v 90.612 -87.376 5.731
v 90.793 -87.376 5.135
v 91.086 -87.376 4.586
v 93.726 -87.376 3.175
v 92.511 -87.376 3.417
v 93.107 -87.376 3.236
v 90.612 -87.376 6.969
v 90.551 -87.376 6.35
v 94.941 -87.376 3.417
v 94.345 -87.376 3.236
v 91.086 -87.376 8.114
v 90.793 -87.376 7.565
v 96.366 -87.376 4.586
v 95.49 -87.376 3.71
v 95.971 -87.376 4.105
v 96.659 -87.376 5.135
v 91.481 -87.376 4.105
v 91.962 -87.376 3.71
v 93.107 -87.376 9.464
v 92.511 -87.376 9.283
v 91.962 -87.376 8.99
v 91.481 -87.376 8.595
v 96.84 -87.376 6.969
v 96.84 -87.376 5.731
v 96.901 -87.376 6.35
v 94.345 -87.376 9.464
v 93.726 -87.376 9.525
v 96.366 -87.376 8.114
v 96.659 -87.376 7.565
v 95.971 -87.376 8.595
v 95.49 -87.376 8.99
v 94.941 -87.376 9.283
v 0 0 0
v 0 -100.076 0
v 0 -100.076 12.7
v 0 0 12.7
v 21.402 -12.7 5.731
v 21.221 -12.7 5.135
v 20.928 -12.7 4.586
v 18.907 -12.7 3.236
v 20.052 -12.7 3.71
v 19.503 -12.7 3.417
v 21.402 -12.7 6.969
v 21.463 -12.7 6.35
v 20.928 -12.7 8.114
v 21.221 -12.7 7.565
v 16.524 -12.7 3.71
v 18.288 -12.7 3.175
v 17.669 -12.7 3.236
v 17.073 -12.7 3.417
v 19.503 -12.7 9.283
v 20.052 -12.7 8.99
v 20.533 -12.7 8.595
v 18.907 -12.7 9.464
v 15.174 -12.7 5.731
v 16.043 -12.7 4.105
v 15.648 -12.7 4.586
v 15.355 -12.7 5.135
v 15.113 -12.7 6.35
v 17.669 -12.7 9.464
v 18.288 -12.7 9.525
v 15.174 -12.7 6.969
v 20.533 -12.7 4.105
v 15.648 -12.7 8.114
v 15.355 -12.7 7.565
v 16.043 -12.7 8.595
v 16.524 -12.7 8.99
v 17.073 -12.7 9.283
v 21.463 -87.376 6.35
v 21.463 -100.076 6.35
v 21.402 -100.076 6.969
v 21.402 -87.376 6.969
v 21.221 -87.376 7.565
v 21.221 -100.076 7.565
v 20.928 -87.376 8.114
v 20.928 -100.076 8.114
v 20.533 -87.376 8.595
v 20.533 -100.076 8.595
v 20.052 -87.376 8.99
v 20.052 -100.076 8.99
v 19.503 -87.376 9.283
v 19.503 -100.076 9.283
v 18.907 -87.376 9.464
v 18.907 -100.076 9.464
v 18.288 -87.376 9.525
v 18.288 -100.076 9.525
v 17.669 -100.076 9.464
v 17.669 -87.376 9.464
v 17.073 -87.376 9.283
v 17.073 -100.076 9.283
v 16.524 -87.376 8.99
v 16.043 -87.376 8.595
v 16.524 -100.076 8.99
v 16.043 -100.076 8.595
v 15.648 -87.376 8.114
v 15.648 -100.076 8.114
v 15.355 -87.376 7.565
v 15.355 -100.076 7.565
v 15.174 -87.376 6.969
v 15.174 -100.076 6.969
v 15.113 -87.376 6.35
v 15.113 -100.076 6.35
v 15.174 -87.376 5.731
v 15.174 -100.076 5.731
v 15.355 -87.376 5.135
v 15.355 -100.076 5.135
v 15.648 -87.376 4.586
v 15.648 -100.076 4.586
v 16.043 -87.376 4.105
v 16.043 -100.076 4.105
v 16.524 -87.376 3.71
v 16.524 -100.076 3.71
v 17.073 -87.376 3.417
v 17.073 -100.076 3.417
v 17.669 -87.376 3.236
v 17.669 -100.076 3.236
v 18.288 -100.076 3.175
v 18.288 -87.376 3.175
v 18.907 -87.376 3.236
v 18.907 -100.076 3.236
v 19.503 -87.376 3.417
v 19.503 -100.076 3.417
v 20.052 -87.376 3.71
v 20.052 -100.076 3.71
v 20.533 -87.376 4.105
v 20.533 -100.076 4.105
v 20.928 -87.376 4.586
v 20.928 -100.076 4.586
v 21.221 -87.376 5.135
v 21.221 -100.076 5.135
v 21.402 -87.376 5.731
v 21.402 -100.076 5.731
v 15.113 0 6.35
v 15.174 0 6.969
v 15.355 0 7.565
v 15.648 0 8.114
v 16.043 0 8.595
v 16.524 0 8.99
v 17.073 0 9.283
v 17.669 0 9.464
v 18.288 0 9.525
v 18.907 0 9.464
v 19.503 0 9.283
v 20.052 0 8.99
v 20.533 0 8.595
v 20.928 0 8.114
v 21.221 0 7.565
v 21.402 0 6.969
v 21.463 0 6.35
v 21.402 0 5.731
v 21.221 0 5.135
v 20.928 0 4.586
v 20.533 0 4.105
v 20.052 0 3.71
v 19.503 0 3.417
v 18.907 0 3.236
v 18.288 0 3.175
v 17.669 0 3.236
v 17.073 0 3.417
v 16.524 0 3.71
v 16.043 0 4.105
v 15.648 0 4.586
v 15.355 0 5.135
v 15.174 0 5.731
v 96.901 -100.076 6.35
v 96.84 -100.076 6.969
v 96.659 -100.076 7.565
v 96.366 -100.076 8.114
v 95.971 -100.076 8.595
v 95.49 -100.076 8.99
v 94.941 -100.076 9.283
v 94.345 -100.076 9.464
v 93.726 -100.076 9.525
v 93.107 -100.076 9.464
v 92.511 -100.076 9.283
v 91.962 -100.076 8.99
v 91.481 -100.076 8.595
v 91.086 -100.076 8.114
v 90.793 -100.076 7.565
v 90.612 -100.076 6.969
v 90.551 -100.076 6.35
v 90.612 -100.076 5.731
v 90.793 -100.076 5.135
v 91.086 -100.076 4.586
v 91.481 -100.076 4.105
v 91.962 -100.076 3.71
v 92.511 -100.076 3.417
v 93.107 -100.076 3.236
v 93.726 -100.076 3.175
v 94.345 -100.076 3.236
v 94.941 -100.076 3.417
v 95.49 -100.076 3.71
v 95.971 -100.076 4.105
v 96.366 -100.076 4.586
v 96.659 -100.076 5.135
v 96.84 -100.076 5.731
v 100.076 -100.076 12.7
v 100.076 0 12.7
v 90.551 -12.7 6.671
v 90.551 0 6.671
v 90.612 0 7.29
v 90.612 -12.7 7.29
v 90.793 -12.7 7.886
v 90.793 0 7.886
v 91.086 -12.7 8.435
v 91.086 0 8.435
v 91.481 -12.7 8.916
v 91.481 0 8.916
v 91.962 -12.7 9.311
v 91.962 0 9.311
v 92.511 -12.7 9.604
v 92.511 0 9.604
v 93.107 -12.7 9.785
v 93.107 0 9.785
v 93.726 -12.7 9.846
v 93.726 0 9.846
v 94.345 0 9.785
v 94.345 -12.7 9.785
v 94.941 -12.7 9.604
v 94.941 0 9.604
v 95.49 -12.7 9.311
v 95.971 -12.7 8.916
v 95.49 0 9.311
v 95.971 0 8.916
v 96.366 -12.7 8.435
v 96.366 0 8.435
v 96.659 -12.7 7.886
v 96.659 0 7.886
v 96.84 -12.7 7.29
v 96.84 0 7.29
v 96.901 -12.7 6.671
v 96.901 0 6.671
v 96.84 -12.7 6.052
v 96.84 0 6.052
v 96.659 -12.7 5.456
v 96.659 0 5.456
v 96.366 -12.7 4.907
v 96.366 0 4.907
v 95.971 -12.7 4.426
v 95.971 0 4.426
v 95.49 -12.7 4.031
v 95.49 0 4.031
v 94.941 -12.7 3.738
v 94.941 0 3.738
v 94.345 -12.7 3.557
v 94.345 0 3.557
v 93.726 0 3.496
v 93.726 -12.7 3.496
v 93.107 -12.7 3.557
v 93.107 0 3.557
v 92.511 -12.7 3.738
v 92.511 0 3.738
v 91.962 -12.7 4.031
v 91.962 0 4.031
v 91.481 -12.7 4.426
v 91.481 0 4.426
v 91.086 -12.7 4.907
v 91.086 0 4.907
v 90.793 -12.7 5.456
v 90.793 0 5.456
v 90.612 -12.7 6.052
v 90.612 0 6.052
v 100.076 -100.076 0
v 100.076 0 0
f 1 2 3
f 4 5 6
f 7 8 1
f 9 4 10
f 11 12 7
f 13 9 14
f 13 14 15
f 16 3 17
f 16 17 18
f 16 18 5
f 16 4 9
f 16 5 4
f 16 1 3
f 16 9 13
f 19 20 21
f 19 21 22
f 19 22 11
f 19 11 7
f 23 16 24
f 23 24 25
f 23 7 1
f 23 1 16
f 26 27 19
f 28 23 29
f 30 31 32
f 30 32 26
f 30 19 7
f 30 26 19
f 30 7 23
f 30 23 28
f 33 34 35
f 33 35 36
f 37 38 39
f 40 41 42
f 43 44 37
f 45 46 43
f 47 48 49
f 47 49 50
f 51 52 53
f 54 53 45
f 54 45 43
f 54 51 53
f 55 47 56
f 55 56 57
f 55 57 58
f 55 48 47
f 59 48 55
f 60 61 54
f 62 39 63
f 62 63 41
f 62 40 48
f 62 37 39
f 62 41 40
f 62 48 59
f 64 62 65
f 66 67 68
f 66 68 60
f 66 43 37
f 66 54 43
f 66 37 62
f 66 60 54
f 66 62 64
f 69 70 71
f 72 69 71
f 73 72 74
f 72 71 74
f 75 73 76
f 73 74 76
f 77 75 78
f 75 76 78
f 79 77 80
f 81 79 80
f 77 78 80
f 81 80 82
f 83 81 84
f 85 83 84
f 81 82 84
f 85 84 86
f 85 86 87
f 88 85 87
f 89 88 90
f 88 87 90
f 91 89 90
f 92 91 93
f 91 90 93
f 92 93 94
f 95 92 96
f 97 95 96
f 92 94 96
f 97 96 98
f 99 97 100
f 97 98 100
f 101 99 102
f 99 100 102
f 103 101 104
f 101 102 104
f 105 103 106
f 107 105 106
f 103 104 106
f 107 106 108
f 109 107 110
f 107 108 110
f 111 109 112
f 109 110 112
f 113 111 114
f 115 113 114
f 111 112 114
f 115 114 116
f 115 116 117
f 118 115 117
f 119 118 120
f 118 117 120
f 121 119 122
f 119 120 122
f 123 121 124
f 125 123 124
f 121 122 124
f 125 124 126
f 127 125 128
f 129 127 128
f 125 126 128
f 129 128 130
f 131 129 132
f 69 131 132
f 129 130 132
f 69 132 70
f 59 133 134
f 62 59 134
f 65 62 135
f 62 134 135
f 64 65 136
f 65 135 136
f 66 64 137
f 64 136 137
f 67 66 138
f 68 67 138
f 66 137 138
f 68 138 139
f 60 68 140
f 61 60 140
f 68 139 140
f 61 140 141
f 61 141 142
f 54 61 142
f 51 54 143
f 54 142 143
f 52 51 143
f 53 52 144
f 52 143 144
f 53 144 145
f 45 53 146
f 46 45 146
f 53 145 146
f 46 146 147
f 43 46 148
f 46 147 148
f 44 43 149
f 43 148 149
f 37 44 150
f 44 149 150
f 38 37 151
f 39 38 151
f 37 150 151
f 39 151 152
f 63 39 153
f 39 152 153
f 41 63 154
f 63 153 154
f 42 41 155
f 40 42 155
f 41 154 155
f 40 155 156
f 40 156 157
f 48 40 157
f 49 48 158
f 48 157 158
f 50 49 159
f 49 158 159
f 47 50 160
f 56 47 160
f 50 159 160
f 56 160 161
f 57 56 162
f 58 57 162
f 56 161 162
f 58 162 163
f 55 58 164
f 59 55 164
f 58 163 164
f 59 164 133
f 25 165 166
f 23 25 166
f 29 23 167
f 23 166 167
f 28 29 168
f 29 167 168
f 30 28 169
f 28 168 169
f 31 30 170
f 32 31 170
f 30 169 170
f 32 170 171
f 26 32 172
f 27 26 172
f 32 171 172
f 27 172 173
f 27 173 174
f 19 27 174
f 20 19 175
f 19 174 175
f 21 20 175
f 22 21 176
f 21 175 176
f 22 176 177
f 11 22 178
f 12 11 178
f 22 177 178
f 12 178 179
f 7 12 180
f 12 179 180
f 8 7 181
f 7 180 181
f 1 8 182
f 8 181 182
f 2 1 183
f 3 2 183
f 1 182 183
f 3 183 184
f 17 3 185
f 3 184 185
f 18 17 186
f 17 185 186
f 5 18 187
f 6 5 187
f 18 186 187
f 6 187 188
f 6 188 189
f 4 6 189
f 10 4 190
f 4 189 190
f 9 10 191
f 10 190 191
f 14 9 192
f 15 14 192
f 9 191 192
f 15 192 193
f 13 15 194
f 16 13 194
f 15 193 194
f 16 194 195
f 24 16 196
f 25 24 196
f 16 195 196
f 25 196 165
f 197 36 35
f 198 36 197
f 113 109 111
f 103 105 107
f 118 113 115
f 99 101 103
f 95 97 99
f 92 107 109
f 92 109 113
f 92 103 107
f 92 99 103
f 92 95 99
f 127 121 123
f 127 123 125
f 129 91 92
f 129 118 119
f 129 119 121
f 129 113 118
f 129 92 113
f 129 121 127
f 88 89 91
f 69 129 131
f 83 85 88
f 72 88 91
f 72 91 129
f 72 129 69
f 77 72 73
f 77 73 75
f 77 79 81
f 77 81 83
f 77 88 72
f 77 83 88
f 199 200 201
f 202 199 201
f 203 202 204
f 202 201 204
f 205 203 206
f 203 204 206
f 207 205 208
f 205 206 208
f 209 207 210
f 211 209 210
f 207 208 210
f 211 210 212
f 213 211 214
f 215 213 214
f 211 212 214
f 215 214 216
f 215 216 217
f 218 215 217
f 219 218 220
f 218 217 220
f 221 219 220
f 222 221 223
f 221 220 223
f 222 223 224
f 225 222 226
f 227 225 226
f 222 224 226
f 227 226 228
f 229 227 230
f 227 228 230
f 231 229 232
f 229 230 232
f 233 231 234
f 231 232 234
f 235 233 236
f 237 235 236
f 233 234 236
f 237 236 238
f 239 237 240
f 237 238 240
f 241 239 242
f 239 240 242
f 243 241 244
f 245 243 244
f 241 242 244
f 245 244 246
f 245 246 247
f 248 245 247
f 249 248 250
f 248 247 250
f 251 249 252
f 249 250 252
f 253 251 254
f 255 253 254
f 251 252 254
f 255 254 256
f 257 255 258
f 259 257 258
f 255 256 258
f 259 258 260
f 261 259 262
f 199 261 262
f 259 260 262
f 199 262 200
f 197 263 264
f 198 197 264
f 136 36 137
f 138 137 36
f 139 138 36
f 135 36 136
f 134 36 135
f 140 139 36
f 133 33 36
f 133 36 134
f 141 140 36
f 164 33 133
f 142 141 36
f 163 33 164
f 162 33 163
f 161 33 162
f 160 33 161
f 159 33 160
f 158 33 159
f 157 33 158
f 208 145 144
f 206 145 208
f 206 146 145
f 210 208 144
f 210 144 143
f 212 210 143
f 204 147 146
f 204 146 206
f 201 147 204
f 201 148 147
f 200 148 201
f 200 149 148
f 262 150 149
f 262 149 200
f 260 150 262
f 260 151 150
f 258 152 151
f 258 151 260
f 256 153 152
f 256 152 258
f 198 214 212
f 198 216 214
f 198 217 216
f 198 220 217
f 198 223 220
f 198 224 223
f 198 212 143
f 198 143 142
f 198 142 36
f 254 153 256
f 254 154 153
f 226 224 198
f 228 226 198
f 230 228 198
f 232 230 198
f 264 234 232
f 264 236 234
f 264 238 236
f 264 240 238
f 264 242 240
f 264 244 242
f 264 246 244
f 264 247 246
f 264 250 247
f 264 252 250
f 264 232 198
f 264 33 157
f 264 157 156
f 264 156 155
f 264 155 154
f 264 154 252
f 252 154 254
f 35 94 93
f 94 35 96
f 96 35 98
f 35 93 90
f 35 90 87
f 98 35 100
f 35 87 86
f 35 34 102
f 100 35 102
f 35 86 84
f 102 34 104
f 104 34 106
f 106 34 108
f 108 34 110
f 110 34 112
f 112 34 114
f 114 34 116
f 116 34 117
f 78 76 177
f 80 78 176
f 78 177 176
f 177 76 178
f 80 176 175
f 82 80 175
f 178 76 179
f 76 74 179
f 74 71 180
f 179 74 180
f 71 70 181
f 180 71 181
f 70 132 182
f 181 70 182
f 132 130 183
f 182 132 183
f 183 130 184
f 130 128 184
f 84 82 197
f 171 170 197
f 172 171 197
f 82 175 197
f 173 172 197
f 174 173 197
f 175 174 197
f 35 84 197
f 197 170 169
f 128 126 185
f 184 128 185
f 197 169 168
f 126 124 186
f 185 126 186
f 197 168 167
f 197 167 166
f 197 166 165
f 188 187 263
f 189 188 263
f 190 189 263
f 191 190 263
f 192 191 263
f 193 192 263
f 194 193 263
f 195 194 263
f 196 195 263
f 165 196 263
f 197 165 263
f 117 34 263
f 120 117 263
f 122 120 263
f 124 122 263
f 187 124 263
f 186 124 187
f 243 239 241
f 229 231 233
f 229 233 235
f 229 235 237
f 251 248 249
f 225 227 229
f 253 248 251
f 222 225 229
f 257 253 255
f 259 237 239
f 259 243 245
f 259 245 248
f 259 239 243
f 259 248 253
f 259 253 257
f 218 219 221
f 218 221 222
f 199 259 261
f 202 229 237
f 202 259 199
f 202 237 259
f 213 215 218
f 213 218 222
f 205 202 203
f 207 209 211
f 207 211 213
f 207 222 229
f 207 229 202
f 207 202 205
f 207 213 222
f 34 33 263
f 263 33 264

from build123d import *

# Parameters (mm, degrees)
F0_W     = 100.076
F0_H     = 100.076
F1_DEPTH = 12.7
F2_R     = 3.175
F3_DEPTH = 12.7
F4_R     = 3.175
F5_DEPTH = 12.7


with BuildPart() as f1:
    # F0 (on Top) → F1 (new body)
    with BuildSketch(Plane.XY):
        with Locations((50.038, -50.038)):
            Rectangle(F0_W, F0_H)
    extrude(amount=F1_DEPTH)

    # F2 (on face) → F3 (cut)
    with BuildSketch(Plane.XZ.offset(100.076)):
        with Locations((93.726, 6.35)):
            Circle(F2_R)
        with Locations((18.288, 6.35)):
            Circle(F2_R)
    extrude(amount=-F3_DEPTH, mode=Mode.SUBTRACT)

    # F4 (on face) → F5 (cut)
    with BuildSketch(Plane(origin=(0, 0, 0), x_dir=(-1, 0, 0), z_dir=(0, 1, 0))):
        with Locations((-93.726, 6.671018)):
            Circle(F4_R)
        with Locations((-18.288, 6.35)):
            Circle(F4_R)
    extrude(amount=-F5_DEPTH, mode=Mode.SUBTRACT)


solid = f1.part
